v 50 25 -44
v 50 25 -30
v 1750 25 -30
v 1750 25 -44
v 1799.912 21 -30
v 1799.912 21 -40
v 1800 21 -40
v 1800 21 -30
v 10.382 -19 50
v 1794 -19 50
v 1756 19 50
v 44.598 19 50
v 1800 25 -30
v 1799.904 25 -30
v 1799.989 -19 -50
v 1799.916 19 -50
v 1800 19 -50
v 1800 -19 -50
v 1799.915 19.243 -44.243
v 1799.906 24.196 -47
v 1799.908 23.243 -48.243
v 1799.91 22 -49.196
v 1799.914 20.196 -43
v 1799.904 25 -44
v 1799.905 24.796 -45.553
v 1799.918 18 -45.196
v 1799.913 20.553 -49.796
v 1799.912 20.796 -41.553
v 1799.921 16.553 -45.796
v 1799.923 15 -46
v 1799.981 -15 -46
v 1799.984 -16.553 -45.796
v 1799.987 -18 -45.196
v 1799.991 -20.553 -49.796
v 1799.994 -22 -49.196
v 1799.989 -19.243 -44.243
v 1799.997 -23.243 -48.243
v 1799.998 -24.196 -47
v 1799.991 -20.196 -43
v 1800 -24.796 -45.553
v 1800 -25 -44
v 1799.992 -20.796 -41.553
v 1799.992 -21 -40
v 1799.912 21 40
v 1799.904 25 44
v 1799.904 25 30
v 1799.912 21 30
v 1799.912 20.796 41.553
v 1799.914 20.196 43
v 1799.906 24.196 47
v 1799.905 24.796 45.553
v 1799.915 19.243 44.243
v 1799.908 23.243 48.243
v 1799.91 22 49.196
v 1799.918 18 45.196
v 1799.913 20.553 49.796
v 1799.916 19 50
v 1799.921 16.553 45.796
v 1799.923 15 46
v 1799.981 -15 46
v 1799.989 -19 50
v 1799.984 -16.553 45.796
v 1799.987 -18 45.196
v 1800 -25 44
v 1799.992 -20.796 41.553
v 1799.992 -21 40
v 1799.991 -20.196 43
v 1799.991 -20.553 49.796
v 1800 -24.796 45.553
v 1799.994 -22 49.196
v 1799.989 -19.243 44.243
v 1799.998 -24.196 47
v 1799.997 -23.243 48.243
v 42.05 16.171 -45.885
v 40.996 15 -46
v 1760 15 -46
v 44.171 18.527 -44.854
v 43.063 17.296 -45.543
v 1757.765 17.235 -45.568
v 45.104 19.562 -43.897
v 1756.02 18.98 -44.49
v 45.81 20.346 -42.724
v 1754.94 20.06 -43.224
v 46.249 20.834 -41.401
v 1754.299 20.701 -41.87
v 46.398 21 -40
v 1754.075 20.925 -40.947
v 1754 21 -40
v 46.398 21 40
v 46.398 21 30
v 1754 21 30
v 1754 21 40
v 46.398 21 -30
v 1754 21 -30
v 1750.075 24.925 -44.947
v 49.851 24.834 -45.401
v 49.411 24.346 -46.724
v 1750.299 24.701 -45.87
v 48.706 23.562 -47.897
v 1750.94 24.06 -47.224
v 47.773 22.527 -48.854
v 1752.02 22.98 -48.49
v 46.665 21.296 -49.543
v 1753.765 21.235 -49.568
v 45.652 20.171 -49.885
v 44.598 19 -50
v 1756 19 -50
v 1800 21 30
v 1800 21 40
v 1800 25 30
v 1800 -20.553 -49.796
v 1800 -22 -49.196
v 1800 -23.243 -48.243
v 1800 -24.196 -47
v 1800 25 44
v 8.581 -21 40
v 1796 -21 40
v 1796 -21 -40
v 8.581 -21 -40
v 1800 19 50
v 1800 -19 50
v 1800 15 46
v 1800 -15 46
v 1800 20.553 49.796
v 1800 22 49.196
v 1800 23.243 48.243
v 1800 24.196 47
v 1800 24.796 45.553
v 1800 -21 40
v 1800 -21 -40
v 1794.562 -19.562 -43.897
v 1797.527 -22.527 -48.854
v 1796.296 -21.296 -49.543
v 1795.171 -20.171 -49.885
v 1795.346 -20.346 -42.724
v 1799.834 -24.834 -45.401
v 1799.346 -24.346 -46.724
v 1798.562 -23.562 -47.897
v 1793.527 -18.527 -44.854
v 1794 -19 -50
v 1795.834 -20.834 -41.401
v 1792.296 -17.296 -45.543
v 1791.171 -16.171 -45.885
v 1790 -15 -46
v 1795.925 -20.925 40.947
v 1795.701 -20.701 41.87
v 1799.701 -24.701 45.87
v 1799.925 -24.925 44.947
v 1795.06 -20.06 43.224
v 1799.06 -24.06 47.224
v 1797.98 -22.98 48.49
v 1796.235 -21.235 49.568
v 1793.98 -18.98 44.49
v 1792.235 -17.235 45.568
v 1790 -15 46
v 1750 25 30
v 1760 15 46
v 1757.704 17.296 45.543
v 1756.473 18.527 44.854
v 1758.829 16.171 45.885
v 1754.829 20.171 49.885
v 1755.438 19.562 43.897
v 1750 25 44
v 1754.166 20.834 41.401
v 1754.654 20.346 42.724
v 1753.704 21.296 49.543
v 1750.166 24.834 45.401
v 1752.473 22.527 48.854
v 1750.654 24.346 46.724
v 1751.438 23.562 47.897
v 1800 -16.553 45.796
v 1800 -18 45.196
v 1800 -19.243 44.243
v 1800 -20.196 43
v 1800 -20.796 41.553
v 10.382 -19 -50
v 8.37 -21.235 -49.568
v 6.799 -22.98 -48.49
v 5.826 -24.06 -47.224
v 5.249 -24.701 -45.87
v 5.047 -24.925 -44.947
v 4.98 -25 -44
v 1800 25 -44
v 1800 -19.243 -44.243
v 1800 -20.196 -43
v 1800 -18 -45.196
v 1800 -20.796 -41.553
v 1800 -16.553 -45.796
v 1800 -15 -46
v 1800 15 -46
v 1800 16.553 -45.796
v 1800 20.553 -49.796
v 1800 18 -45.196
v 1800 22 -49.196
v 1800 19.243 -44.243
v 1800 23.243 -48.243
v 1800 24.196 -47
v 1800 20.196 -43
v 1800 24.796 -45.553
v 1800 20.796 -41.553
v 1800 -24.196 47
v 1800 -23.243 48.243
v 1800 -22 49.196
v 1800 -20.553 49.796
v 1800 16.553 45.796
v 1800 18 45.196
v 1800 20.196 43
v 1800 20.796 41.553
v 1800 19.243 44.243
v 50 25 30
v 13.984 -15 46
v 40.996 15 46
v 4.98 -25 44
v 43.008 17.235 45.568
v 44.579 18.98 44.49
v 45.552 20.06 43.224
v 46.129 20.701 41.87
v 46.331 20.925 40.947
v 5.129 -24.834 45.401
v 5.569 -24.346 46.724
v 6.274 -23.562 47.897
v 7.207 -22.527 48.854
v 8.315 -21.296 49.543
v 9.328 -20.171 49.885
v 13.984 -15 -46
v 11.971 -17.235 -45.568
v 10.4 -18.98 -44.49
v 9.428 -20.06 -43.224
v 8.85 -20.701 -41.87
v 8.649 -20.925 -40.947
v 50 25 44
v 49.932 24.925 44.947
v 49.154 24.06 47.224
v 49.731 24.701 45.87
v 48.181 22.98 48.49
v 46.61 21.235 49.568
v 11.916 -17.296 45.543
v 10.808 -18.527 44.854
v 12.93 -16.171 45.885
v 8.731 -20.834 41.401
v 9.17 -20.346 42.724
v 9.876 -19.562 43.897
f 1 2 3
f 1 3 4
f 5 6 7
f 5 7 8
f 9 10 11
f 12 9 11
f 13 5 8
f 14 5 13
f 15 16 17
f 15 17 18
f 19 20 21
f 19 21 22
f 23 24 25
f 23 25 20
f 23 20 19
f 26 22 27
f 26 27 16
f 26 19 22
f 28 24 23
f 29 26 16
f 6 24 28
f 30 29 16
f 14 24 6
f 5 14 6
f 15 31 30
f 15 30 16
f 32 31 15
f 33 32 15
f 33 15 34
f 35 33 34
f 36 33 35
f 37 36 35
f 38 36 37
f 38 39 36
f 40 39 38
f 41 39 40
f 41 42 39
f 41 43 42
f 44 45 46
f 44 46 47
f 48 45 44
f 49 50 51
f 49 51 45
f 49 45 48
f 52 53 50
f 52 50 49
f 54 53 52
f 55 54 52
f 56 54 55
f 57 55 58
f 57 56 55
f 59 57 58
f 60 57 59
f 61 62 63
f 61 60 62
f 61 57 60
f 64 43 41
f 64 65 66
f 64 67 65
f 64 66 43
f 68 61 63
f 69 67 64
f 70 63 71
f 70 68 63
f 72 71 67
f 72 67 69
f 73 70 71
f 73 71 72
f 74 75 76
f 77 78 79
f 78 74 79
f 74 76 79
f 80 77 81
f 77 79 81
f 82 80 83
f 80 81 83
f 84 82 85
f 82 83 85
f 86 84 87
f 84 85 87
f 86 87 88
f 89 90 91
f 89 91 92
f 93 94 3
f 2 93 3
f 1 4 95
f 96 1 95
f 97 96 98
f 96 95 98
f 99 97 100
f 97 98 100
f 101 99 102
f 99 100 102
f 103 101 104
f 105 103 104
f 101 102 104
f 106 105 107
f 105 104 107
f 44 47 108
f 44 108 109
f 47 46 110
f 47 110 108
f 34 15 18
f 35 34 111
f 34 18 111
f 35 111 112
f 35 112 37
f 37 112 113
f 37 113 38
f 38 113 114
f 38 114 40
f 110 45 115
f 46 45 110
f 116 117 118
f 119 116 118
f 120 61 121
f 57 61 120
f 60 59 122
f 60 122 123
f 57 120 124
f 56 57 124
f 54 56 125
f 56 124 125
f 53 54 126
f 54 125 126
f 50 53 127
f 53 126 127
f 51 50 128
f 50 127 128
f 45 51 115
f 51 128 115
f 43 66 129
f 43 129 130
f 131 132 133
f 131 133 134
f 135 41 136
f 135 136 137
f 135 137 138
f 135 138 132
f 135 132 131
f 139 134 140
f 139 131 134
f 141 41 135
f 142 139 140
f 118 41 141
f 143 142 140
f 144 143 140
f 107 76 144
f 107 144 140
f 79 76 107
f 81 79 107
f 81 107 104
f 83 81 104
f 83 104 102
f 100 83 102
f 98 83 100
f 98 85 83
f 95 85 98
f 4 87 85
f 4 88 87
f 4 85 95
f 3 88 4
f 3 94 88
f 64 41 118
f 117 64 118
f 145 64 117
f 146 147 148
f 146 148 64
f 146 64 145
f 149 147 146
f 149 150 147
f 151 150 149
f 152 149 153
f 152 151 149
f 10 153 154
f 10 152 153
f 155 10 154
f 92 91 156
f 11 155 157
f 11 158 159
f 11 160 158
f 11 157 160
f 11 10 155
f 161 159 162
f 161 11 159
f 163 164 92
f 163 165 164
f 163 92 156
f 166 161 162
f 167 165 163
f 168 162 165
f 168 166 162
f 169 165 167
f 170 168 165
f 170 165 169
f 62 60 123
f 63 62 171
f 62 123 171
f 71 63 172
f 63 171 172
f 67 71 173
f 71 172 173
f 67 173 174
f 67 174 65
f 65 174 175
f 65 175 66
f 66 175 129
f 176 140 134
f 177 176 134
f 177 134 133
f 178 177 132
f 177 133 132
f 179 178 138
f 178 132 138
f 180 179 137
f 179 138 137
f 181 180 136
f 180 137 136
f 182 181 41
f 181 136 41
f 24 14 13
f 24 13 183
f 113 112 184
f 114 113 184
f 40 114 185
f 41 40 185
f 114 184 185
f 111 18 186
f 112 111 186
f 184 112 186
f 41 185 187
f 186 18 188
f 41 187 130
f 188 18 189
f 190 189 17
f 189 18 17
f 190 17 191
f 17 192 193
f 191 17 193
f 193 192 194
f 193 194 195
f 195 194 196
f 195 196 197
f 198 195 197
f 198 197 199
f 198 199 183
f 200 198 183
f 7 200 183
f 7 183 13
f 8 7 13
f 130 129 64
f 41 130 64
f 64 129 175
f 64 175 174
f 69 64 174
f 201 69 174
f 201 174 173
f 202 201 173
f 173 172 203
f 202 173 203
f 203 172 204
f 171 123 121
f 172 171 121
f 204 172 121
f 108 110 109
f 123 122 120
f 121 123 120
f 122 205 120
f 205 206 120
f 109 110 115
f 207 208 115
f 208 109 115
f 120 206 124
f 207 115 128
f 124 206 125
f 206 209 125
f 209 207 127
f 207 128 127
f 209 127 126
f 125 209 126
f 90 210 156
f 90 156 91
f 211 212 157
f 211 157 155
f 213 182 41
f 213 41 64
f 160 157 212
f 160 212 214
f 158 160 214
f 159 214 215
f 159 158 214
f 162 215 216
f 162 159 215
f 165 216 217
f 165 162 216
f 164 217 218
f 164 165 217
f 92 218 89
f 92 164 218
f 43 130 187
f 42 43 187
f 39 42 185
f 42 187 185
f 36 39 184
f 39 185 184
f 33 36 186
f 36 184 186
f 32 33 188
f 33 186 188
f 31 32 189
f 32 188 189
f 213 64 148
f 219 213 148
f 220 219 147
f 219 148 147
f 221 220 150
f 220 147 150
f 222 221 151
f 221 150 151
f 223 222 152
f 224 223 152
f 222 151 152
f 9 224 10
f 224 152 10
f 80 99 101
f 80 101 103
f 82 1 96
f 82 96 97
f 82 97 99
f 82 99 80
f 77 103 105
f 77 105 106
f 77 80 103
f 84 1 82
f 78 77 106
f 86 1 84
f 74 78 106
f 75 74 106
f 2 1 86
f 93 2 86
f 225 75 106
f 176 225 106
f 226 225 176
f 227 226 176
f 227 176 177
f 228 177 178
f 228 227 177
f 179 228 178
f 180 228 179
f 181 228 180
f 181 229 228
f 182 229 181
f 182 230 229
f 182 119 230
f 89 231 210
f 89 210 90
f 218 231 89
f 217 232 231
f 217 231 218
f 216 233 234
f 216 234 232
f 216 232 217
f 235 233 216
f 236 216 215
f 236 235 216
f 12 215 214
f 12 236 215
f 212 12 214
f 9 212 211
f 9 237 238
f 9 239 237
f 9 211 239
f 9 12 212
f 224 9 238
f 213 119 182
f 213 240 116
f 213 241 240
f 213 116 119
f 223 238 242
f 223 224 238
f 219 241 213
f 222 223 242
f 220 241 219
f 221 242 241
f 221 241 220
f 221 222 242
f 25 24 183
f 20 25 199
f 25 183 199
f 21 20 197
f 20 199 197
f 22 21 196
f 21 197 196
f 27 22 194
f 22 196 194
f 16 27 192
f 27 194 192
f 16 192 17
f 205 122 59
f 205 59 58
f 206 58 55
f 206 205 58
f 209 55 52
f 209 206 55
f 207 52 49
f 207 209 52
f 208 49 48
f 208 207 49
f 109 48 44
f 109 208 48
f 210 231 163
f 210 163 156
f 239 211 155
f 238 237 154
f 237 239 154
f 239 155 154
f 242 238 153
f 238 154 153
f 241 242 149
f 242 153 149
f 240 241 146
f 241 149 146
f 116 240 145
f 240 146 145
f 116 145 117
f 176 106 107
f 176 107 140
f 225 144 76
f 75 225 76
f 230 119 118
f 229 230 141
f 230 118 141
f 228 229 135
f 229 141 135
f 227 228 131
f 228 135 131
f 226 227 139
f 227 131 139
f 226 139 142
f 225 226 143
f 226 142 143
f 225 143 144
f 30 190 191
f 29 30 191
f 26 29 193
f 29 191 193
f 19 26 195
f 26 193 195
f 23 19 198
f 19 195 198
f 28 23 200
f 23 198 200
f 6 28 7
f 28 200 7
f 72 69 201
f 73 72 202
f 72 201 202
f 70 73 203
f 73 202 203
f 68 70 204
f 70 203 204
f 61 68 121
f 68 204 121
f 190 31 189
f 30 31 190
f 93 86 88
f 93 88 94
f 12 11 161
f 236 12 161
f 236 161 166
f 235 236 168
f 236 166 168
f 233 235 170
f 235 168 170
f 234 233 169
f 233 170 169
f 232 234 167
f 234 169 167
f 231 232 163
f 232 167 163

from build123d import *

# Parameters (mm, degrees)
RESSALTO_EXTRUS_O1_DEPTH = 1800
FILETE1_R                = 6
CORTE_EXTRUS_O1_DEPTH    = 50
CORTE_EXTRUS_O2_DEPTH    = 50


with BuildPart() as part:
    # Esboço1 → Ressalto-extrusão1 (new body)
    with BuildSketch(Plane(origin=(0, 0, 0), x_dir=(0, 0, -1), z_dir=(1, 0, 0))):
        Polygon((-46, 21), (-46, -21), (46, -21), (46, 21), (30, 21), (30, 25), (50, 25), (50, -25), (-50, -25), (-50, 25), (-30, 25), (-30, 21), align=None)
    extrude(amount=RESSALTO_EXTRUS_O1_DEPTH)

    # Filete1
    filete1_edges = [part.edges().sort_by_distance(p)[0] for p in [
        (900, -25, -50),
        (900, -25, 50),
        (900, 25, 50),
        (900, 21, 46),
        (900, -21, 46),
        (900, -21, -46),
        (900, 21, -46),
        (900, 25, -50),
    ]]
    fillet(filete1_edges, radius=FILETE1_R)

    # Esboço3 → Corte-extrusão1 (cut, symmetric)
    with BuildSketch(Plane.XY):
        Polygon((0, -25), (184.767559257, 159.767559257), (-208.615442636, 104.939092506), align=None)
        Polygon((1800, -25), (1477.707280818, 297.292719182), (1799.383443157, 297.292719182), align=None)
    extrude(amount=CORTE_EXTRUS_O1_DEPTH, both=True, mode=Mode.SUBTRACT)


with BuildPart() as corte_extrus_o1_piece_1:
    # of the separate pieces the step leaves, piece 1, a body of its own (corte_extrus_o1_pieces)
    add(part.part.solids().sort_by_distance((40, 15, 46))[0])

    # Esboço4 → Corte-extrusão2 (cut, symmetric)
    with BuildSketch(Plane.XY):
        Polygon((50, 25), (-16.235639867, -48.562130564), (-42.129730134, -17.715767118), align=None)
    extrude(amount=CORTE_EXTRUS_O2_DEPTH, both=True, mode=Mode.SUBTRACT)


with BuildPart() as corte_extrus_o1_piece_2:
    # of the separate pieces the step leaves, piece 2, a body of its own (corte_extrus_o1_pieces)
    add(part.part.solids().sort_by_distance((1800, 15, 46))[0])


solid = Compound([corte_extrus_o1_piece_1.part, corte_extrus_o1_piece_2.part])
